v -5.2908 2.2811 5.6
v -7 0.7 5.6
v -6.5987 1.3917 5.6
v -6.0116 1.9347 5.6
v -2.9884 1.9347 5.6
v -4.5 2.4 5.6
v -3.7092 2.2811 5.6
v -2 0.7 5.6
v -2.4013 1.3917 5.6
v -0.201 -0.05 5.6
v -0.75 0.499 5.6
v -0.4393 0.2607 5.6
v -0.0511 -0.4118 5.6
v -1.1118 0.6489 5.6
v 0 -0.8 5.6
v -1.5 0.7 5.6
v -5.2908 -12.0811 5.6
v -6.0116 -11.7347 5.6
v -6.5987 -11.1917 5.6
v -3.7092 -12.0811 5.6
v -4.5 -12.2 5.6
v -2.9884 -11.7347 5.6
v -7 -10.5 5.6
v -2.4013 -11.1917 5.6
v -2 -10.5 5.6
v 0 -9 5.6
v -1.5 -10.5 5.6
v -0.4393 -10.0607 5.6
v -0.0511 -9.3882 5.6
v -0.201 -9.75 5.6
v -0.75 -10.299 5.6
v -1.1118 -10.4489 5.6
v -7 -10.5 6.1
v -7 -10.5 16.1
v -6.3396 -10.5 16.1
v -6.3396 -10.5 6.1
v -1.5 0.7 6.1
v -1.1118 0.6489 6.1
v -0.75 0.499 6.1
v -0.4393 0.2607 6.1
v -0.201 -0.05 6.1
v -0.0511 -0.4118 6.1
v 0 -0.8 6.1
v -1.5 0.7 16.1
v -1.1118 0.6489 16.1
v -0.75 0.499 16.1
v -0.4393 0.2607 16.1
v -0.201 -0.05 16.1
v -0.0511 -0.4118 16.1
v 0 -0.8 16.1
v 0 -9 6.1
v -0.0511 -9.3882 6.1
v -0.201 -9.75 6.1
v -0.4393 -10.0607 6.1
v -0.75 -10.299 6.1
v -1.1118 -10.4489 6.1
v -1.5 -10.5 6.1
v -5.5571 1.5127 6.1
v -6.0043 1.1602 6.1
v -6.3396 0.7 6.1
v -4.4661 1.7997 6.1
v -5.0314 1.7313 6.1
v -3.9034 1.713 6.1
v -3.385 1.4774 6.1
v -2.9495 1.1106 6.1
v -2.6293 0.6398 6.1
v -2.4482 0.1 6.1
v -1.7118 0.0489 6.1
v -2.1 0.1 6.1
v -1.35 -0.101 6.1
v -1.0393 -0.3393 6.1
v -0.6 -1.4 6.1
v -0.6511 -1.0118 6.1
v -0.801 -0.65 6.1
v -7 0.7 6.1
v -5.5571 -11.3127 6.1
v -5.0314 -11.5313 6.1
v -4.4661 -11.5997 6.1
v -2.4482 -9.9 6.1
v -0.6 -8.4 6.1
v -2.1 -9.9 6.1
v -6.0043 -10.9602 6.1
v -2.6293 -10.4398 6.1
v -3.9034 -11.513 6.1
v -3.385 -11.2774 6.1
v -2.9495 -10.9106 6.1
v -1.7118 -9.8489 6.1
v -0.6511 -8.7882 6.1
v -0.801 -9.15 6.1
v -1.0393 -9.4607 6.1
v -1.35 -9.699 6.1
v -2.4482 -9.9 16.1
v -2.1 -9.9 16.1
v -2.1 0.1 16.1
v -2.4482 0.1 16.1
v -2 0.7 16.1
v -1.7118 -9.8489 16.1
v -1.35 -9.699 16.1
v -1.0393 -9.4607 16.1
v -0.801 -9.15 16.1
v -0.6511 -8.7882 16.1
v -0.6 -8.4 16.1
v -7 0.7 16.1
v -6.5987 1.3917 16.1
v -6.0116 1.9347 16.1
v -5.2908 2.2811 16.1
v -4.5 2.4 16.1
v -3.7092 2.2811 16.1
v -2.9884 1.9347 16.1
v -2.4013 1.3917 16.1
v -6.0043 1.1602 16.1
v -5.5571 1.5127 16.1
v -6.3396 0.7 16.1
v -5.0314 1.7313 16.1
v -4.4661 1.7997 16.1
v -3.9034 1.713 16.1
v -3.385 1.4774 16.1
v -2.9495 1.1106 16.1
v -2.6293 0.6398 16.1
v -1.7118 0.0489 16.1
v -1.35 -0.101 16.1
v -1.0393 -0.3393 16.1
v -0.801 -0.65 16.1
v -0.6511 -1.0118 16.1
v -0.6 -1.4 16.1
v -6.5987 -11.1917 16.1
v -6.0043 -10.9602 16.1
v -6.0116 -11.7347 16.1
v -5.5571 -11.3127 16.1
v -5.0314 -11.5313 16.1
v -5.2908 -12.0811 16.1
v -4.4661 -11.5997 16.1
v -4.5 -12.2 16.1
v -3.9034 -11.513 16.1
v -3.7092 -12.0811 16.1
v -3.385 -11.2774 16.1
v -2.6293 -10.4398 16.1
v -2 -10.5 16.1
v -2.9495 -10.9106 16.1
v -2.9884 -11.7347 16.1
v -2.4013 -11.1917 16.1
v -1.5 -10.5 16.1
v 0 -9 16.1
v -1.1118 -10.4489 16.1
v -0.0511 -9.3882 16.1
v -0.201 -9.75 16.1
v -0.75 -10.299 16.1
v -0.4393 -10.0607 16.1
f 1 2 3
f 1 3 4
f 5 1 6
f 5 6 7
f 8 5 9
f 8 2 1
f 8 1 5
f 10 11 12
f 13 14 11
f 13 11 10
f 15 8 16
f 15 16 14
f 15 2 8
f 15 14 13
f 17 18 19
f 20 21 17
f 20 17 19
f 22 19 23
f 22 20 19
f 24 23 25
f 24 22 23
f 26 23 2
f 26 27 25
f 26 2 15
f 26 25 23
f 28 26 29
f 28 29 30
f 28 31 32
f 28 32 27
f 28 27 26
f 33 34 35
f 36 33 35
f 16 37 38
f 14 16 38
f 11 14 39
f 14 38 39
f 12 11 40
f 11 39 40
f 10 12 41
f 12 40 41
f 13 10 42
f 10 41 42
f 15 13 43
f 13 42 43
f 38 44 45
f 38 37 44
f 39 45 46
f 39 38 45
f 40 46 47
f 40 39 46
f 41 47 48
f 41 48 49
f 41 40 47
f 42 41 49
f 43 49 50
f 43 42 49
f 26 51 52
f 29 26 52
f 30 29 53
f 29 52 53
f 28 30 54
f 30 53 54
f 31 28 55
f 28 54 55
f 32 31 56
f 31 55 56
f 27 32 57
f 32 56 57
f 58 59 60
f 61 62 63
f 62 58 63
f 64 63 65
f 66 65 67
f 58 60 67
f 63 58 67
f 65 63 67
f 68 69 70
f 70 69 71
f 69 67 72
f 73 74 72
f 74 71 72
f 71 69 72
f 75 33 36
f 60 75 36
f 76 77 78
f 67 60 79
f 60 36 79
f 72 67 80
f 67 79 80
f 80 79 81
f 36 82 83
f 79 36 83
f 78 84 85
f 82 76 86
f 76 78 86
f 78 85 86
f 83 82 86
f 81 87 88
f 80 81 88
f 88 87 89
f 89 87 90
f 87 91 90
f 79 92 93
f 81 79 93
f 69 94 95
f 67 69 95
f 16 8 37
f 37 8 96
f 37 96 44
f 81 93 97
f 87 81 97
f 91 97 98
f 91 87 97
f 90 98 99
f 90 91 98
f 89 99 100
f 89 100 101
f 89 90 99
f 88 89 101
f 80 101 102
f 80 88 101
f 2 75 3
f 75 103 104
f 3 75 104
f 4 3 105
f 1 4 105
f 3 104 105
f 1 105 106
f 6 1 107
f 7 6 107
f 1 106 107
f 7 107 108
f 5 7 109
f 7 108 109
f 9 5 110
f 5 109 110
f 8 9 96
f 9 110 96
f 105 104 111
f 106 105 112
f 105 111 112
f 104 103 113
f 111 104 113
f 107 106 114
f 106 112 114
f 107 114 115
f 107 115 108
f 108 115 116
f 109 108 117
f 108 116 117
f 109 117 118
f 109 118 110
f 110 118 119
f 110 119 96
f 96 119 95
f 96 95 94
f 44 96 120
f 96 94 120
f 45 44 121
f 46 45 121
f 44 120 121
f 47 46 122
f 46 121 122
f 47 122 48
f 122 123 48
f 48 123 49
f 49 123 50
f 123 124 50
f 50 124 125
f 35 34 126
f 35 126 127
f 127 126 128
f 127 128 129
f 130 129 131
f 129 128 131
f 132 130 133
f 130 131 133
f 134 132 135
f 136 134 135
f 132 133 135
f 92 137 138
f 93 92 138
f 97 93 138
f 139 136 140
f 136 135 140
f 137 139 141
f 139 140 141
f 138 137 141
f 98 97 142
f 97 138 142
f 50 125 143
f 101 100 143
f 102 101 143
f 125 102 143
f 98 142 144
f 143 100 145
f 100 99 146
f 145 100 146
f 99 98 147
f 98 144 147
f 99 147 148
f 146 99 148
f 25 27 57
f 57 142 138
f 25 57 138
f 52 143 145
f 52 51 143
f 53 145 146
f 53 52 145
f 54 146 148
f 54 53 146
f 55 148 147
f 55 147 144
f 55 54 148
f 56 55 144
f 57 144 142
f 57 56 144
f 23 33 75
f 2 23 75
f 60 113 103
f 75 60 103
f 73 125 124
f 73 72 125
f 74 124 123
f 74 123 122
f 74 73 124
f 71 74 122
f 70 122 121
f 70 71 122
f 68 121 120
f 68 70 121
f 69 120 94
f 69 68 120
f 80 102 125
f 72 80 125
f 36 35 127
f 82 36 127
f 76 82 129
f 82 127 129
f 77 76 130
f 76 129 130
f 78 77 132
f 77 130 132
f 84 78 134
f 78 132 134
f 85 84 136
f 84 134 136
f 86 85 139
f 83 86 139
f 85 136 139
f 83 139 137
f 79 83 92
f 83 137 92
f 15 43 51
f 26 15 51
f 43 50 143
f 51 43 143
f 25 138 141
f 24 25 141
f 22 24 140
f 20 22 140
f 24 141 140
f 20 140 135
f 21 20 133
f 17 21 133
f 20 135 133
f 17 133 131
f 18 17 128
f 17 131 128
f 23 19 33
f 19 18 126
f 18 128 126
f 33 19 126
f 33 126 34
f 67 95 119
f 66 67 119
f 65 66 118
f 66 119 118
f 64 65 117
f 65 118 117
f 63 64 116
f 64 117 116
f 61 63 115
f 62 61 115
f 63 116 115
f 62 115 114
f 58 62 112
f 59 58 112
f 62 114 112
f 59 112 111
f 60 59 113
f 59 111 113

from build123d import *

# Parameters (mm, degrees)
F1_DEPTH = 10
F2_R     = 1.5
F4_DEPTH = 0.5
F5_ANGLE = -90


with BuildPart() as f1:
    # F0 (on Front) → F1 (new body)
    with BuildSketch(Plane.XZ):
        with BuildLine():
            Line((-2, -5.6), (0, -5.6))
            Line((0, -5.6), (0, 5.6))
            Line((0, 5.6), (-2, 5.6))
            ThreePointArc((-2, 5.6), (-4.5, 7.3), (-7, 5.6))
            Line((-7, 5.6), (-6.339597, 5.6))
            ThreePointArc((-6.339597, 5.6), (-4.181785, 6.675612), (-2.448172, 5))
            Line((-2.448172, 5), (-0.6, 5))
            Line((-0.6, 5), (-0.6, -5))
            Line((-0.6, -5), (-2.448172, -5))
            ThreePointArc((-2.448172, -5), (-4.181785, -6.675612), (-6.339597, -5.6))
            Line((-6.339597, -5.6), (-7, -5.6))
            ThreePointArc((-7, -5.6), (-4.5, -7.3), (-2, -5.6))
        make_face()
    extrude(amount=F1_DEPTH)

    # F2
    f2_edges = [f1.edges().sort_by_distance(p)[0] for p in [
        (0, -5, 5.6),
        (0, -5, -5.6),
        (-0.6, -5, 5),
        (-0.6, -5, -5),
    ]]
    fillet(f2_edges, radius=F2_R)

    # F3 (on face) → F4 (join)
    with BuildSketch(Plane.XZ.offset(10)):
        with BuildLine():
            Line((-6.339597, 5.6), (-7, 5.6))
            Line((-7, 5.6), (-7, -5.6))
            Line((-7, -5.6), (-6.339597, -5.6))
            ThreePointArc((-6.339597, -5.6), (-4.181785, -6.675612), (-2.448172, -5))
            Line((-2.448172, -5), (-2.1, -5))
            ThreePointArc((-2.1, -5), (-1.03934, -4.56066), (-0.6, -3.5))
            Line((-0.6, -3.5), (-0.6, 3.5))
            ThreePointArc((-0.6, 3.5), (-1.03934, 4.56066), (-2.1, 5))
            Line((-2.1, 5), (-2.448172, 5))
            ThreePointArc((-2.448172, 5), (-4.181785, 6.675612), (-6.339597, 5.6))
        make_face()
        with BuildLine():
            Line((-1.5, 5.6), (-2, 5.6))
            ThreePointArc((-2, 5.6), (-4.5, 7.3), (-7, 5.6))
            Line((-7, 5.6), (-6.339597, 5.6))
            ThreePointArc((-6.339597, 5.6), (-4.181785, 6.675612), (-2.448172, 5))
            Line((-2.448172, 5), (-2.1, 5))
            ThreePointArc((-2.1, 5), (-1.03934, 4.56066), (-0.6, 3.5))
            Line((-0.6, 3.5), (-0.6, -3.5))
            ThreePointArc((-0.6, -3.5), (-1.03934, -4.56066), (-2.1, -5))
            Line((-2.1, -5), (-2.448172, -5))
            ThreePointArc((-2.448172, -5), (-4.181785, -6.675612), (-6.339597, -5.6))
            Line((-6.339597, -5.6), (-7, -5.6))
            ThreePointArc((-7, -5.6), (-4.5, -7.3), (-2, -5.6))
            Line((-2, -5.6), (-1.5, -5.6))
            ThreePointArc((-1.5, -5.6), (-0.43934, -5.16066), (0, -4.1))
            Line((0, -4.1), (0, 4.1))
            ThreePointArc((0, 4.1), (-0.43934, 5.16066), (-1.5, 5.6))
        make_face()
    extrude(amount=F4_DEPTH)


with BuildPart() as f1_1:
    # F5: moved
    add(f1.part.rotate(Axis((-1.75, -10.5, 5.6), (-1, 0, 0)), F5_ANGLE))


solid = f1_1.part
